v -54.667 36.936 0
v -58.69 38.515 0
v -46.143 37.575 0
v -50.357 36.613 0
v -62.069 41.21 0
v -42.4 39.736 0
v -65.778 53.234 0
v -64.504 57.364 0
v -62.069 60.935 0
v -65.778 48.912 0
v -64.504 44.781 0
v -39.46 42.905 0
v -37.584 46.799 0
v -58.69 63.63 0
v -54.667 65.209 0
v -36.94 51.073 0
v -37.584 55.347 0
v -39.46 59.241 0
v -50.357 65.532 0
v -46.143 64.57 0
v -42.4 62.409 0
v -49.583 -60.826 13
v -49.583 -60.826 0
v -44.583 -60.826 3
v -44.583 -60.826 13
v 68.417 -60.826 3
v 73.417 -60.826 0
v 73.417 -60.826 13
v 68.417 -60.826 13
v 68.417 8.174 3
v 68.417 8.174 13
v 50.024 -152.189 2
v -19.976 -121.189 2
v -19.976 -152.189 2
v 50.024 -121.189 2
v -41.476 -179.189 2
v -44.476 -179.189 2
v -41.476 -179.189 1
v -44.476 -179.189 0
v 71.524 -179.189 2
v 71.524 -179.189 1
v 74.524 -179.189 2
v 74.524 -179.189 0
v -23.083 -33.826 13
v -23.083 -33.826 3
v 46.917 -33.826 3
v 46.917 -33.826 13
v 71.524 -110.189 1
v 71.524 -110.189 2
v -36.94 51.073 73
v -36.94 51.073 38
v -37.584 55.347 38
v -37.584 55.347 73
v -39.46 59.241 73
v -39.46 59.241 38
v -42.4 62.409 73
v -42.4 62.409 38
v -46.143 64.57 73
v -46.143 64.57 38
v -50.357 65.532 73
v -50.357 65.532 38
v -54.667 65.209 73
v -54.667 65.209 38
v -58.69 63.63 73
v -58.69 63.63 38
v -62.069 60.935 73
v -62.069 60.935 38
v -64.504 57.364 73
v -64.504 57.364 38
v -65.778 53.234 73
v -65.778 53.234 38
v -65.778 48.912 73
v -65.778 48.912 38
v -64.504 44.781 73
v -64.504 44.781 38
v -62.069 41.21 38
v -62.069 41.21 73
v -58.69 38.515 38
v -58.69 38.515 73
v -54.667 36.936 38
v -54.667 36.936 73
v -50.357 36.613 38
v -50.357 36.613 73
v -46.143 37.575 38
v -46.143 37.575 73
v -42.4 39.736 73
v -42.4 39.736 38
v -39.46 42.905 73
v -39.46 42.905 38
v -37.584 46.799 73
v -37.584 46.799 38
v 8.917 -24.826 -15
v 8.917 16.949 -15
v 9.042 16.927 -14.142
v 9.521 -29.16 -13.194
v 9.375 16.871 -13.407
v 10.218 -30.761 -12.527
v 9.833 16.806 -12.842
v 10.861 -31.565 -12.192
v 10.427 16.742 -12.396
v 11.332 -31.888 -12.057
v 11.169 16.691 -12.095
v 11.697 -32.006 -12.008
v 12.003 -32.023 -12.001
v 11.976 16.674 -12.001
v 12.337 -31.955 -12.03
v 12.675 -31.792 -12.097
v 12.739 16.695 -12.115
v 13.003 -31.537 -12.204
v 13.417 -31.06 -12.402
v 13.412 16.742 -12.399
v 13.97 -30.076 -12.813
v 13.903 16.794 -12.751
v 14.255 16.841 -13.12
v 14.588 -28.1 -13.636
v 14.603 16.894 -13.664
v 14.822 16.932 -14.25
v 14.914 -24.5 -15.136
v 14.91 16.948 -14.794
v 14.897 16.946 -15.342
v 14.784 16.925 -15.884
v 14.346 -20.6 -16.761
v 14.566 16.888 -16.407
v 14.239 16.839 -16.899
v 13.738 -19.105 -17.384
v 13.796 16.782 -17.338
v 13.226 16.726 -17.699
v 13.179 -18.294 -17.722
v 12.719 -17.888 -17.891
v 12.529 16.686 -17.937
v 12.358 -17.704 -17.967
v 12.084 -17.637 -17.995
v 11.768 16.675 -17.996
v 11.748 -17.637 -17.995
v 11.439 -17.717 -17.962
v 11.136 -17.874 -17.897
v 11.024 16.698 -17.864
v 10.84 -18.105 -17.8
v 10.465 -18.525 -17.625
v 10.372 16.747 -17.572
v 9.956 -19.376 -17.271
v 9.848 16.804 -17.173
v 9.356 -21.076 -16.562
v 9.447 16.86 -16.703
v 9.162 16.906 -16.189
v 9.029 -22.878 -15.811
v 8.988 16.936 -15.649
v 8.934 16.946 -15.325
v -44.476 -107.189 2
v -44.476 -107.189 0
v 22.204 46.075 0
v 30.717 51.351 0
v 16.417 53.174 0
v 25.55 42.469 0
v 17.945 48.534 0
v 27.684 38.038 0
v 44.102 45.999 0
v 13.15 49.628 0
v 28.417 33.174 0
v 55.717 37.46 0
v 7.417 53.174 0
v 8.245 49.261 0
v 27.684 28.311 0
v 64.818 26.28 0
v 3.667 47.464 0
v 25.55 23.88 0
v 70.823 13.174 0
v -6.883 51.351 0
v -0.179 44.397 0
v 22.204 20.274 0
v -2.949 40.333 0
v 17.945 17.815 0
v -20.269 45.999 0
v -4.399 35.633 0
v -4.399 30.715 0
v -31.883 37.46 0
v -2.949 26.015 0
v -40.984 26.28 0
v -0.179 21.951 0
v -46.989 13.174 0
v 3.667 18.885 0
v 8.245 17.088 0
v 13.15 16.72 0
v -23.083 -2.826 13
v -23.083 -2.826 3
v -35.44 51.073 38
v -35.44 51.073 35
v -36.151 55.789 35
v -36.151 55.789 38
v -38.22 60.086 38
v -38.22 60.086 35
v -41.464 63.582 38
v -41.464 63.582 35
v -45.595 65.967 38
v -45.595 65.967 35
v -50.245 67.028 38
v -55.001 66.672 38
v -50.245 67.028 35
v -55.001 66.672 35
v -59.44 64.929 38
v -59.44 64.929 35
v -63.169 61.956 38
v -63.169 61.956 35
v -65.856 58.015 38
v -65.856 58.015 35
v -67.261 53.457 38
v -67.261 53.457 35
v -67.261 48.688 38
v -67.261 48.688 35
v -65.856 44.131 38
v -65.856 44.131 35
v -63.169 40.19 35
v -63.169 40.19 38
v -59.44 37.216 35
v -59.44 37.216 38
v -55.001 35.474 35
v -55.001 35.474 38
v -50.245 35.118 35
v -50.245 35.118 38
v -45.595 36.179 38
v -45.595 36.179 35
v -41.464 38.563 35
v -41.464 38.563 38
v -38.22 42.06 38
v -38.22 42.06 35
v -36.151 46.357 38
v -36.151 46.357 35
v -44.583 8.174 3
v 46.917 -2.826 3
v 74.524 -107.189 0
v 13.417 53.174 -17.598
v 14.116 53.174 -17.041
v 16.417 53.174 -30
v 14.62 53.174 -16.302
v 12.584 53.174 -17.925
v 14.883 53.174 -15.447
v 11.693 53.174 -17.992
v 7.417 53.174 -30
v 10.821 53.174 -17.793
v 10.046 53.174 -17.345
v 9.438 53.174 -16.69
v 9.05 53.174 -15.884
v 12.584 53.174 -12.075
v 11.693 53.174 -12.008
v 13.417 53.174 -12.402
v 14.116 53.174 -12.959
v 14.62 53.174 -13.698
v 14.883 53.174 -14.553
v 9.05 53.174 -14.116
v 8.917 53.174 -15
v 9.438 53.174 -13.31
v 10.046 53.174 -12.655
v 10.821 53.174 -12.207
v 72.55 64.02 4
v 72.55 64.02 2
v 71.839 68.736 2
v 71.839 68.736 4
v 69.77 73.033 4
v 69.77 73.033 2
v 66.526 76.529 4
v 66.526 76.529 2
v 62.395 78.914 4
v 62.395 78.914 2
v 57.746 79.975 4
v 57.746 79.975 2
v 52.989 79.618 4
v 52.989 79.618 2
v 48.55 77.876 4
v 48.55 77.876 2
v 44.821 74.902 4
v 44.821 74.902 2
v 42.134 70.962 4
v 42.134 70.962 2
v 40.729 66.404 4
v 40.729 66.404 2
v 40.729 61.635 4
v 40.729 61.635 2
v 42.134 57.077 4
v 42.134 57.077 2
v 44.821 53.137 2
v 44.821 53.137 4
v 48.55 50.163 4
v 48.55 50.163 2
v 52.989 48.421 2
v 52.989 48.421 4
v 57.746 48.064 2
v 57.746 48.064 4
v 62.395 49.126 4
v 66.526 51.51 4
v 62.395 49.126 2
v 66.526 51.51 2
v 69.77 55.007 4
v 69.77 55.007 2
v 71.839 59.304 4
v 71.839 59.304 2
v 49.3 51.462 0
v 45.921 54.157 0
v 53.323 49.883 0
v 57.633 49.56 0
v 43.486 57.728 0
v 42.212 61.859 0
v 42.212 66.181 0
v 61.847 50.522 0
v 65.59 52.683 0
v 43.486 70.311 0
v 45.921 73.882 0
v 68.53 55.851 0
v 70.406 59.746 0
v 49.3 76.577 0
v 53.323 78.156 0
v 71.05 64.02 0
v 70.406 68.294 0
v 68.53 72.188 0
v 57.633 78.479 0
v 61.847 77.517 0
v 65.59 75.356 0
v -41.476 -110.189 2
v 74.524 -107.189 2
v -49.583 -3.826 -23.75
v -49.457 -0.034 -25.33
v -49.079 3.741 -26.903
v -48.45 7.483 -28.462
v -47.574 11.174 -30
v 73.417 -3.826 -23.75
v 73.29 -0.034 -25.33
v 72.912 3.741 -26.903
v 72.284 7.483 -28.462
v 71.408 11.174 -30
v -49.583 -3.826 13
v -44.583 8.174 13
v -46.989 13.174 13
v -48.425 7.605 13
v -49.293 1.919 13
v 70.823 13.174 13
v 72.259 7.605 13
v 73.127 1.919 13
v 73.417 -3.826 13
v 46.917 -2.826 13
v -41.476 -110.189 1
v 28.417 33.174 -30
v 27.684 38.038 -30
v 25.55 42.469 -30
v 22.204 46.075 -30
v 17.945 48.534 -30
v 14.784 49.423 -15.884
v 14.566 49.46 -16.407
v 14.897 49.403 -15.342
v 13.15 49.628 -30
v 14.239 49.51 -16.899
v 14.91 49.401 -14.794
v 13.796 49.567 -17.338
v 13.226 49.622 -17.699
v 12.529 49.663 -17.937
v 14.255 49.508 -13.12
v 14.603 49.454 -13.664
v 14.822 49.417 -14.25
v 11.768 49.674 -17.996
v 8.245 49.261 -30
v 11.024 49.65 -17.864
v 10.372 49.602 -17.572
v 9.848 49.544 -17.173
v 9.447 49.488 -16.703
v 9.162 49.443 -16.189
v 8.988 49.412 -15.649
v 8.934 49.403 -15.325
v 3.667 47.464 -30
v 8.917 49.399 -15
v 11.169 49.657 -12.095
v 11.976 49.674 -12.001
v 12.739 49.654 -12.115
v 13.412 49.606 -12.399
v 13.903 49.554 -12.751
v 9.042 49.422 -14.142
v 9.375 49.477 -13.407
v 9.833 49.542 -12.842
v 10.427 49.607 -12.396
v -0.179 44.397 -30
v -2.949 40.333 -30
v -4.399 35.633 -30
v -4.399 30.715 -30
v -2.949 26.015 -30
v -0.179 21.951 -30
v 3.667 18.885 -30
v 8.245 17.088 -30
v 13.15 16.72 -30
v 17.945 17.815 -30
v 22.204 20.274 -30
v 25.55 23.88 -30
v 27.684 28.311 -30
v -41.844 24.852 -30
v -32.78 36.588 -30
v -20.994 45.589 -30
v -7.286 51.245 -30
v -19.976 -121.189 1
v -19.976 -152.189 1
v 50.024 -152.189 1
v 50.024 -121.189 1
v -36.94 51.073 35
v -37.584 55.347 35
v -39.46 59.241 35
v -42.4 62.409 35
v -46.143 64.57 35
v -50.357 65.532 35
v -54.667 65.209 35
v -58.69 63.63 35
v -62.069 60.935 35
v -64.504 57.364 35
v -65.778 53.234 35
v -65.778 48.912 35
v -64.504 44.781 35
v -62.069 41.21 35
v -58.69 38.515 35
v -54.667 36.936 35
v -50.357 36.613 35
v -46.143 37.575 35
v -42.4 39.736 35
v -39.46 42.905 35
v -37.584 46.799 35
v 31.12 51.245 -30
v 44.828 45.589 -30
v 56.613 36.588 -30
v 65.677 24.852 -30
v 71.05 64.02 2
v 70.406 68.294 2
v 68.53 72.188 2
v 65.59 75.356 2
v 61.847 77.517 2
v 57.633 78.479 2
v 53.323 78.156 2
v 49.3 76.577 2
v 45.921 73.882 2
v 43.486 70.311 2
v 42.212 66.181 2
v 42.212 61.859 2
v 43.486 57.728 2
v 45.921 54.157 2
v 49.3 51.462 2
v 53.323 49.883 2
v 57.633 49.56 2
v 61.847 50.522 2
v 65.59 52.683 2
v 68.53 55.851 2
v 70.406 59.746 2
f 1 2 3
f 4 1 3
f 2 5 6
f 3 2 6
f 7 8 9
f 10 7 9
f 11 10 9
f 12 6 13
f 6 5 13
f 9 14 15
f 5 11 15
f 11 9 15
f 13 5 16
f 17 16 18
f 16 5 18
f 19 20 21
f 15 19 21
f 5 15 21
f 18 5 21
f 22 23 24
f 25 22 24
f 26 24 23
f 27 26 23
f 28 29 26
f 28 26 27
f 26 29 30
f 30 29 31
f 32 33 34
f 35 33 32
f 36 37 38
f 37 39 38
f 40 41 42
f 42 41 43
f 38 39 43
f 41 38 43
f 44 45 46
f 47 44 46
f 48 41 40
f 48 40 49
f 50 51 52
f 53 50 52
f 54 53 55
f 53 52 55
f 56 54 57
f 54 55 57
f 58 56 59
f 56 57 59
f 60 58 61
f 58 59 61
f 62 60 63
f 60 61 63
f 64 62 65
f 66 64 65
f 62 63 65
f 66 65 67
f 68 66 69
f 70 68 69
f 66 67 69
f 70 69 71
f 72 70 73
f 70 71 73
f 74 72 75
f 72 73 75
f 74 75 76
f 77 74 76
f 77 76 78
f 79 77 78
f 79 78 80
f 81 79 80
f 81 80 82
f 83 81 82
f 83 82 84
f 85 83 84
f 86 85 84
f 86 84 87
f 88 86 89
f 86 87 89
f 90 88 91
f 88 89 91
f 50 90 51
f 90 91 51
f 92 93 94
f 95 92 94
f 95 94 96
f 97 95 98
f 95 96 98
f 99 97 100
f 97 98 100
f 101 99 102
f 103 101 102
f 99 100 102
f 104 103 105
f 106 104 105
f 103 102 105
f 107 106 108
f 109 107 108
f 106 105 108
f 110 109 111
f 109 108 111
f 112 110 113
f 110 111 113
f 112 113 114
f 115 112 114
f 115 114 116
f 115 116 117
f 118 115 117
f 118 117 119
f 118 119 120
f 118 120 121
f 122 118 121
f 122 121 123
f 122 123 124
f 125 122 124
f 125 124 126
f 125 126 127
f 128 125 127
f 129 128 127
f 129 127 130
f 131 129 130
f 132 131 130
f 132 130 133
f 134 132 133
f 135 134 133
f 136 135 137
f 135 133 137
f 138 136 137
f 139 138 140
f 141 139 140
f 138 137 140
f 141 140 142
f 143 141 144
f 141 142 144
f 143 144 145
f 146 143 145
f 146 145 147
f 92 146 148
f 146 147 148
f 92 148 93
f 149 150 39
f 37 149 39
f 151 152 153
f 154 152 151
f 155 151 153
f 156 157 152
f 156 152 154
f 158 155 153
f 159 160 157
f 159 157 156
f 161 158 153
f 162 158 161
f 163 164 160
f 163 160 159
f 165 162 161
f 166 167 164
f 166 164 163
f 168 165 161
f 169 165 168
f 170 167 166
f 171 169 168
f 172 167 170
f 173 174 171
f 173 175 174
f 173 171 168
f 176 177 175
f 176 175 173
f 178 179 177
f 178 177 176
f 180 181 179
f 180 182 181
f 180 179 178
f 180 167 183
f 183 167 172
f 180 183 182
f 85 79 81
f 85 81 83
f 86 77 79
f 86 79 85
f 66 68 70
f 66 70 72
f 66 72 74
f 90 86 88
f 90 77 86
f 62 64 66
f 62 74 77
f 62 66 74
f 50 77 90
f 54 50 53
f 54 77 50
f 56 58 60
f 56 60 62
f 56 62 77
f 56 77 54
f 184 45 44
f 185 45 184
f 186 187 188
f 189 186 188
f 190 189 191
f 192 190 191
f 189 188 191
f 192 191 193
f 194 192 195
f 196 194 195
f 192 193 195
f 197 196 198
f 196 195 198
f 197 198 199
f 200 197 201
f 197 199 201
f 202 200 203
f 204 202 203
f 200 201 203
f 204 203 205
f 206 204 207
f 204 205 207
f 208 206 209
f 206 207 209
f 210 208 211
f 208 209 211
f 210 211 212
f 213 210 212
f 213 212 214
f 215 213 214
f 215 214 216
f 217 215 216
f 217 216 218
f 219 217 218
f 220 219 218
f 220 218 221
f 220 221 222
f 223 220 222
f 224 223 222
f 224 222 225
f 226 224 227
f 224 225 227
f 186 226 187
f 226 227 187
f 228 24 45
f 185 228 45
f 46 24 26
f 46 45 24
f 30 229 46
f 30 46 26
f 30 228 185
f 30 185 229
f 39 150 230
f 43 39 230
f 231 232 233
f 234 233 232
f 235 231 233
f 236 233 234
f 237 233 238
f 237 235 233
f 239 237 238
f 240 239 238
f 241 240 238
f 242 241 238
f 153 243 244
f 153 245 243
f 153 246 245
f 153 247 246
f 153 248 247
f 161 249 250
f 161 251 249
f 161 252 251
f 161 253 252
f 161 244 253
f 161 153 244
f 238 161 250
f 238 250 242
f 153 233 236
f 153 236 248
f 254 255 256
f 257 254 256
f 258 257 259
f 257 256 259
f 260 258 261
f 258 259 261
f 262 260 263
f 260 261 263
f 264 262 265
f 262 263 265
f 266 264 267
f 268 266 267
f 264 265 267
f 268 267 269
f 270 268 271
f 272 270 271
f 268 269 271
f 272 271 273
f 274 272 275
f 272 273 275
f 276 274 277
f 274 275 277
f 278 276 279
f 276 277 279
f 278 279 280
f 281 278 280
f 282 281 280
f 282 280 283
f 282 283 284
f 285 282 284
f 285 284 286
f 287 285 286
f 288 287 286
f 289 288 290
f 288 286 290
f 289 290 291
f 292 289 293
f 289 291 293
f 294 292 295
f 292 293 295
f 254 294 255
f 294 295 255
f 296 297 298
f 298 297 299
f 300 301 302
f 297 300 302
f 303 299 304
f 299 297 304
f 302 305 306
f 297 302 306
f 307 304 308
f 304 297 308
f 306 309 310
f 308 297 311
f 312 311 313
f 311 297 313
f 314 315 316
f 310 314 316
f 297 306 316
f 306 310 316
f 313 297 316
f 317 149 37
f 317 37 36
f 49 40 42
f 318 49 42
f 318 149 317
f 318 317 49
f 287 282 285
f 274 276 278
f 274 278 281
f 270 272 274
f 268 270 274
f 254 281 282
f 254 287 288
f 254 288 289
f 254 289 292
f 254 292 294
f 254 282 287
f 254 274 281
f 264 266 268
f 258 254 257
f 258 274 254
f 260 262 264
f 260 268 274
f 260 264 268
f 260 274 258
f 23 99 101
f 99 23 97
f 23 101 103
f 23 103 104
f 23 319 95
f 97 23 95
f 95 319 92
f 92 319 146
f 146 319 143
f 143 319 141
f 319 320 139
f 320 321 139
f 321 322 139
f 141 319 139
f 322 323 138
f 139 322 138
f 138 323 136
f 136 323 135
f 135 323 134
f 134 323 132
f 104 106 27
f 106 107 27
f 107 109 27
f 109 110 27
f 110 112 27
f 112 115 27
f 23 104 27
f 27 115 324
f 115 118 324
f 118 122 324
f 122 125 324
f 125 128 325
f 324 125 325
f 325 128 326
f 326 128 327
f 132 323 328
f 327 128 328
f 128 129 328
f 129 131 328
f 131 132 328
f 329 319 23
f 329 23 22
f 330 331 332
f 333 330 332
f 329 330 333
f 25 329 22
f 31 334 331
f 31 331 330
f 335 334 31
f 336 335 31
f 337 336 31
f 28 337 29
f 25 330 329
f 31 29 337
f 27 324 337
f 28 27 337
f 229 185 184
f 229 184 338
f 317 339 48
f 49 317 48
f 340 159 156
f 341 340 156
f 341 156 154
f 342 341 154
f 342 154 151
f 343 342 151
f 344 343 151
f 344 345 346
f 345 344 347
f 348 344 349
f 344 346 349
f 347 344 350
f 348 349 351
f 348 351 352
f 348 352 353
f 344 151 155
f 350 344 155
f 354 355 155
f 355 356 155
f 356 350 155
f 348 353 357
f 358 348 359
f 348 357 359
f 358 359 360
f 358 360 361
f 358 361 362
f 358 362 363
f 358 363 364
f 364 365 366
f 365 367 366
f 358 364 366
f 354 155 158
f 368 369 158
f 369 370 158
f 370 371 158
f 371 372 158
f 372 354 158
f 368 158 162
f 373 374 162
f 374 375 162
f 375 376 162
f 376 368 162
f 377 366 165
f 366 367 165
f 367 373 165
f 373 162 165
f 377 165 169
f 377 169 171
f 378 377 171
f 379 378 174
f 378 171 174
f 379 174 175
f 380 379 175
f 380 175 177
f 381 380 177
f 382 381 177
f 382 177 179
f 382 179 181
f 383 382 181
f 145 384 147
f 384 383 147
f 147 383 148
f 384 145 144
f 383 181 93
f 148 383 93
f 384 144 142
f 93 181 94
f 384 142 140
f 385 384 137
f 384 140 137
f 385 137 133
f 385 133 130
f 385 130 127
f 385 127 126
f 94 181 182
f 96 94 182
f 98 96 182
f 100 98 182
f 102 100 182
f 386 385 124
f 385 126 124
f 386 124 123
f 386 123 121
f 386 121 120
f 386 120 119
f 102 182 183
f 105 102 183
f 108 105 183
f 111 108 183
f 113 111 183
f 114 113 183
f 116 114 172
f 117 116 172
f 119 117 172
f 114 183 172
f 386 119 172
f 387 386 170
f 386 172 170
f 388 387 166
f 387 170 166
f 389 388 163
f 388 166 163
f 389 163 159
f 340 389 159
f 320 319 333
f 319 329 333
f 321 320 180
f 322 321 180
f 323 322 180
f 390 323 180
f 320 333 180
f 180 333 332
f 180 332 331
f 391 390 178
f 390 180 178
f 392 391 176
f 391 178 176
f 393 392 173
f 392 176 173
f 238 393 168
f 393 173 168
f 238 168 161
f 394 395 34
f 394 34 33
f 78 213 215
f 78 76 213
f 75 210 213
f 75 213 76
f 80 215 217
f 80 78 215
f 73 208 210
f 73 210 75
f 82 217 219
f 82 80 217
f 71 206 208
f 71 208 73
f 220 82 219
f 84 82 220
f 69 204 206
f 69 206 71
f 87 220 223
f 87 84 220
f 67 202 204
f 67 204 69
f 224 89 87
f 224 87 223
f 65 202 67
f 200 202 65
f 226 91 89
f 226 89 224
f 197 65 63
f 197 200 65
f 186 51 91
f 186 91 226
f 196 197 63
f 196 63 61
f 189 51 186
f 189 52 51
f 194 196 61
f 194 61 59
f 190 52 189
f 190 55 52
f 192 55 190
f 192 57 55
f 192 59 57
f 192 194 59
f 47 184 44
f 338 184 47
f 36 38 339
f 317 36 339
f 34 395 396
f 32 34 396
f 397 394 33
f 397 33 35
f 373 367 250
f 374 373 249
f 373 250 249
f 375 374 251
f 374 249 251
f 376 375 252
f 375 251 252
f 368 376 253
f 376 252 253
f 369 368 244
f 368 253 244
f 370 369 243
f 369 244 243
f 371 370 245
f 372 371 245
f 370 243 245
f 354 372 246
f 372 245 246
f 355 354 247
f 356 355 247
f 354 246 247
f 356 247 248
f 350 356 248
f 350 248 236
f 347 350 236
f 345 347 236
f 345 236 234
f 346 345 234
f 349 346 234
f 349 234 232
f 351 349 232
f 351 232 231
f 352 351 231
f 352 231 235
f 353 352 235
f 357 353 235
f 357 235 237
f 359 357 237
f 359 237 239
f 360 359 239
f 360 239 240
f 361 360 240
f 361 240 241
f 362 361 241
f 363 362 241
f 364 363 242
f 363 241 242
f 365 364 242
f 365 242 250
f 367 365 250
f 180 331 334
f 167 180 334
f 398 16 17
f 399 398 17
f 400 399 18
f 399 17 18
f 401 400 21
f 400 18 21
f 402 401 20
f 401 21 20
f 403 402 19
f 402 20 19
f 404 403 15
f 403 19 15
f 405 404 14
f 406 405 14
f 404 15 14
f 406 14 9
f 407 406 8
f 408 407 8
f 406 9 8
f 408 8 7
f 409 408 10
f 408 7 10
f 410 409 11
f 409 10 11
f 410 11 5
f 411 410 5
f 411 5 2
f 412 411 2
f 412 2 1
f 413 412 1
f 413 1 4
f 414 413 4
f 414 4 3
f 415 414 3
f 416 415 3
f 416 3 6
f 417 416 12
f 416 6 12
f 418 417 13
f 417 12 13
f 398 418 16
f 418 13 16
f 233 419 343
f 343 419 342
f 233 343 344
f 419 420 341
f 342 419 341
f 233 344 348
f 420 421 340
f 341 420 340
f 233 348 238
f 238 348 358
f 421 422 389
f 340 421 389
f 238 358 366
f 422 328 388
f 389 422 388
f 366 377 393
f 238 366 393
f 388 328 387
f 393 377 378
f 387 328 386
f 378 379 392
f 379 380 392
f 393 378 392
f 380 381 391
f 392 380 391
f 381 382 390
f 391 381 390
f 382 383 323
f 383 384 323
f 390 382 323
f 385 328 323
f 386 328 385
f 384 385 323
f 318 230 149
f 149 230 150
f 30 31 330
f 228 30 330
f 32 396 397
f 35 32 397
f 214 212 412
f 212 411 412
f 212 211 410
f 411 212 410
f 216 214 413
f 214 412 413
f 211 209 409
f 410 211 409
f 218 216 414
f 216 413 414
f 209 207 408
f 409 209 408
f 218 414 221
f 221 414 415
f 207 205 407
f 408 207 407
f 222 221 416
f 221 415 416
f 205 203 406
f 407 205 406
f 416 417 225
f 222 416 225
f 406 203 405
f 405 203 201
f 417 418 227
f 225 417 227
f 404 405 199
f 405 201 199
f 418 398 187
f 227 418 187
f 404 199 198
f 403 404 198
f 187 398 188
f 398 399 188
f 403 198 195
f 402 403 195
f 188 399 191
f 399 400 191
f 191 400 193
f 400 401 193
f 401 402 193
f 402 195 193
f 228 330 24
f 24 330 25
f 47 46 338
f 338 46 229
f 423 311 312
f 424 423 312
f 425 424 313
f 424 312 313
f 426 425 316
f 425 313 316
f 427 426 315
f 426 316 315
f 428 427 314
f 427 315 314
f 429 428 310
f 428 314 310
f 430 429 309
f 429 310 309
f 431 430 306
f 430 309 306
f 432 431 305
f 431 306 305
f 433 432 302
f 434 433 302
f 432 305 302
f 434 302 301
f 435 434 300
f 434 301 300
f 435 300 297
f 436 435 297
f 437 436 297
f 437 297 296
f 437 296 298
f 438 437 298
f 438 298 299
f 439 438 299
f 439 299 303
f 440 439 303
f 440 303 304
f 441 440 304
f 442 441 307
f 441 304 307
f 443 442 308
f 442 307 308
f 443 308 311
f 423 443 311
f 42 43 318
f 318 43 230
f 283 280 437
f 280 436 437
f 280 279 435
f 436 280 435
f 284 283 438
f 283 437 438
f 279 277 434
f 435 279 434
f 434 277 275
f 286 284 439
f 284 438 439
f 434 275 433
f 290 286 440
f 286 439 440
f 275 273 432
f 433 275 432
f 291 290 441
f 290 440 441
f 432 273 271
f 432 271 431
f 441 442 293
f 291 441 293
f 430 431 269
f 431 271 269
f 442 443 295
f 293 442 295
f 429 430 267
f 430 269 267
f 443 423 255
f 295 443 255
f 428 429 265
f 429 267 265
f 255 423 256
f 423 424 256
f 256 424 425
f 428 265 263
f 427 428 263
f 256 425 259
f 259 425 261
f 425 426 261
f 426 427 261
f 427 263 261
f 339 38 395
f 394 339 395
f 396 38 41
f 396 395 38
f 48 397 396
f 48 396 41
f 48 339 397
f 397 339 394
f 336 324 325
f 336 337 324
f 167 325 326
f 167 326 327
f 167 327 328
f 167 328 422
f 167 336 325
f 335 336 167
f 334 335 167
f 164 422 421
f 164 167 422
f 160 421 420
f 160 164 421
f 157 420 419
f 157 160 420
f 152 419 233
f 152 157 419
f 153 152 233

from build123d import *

# Parameters (mm, degrees)
F0_R      = 14.5
F1_DEPTH  = 35
F2_R      = 16
F3_DEPTH  = 3
F4_R      = 14.5
F5_DEPTH  = 35
F6_W      = 113
F6_H      = 69
F7_DEPTH  = 3
F8_W      = 70
F8_H      = 31
F9_DEPTH  = 10
F10_W     = 69
F10_H     = 13
F11_DEPTH = 5
F12_W     = 118
F12_H     = 13
F13_DEPTH = 5
F14_W     = 74
F14_H     = 13
F15_DEPTH = 5
F16_W     = 123
F16_H     = 74
F17_DEPTH = 30
F18_W     = 123
F18_H     = 30
F19_DEPTH = 40
F20_R     = 16.5
F21_DEPTH = 30.001
F22_SIZE2 = 72
F22_SIZE  = 30
F23_R     = 57
F24_R     = 57
F25_R     = 3
F26_DEPTH = 114.001
F27_R     = 14.5
F28_DEPTH = 2
F29_R     = 16
F30_DEPTH = 2
F31_W     = 119
F31_H     = 72
F32_DEPTH = 1
F33_W     = 3
F33_H     = 3
F33_W_2   = 113
F33_H_2   = 69
F34_DEPTH = 1
F35_W     = 70
F35_H     = 31
F36_DEPTH = 1


with BuildPart() as f1:
    # F0 (on Top) → F1 (new body)
    with BuildSketch(Plane.XY):
        with Locations((-51.4401979744, 51.072768867)):
            Circle(F0_R)
    extrude(amount=F1_DEPTH)

    # F2 (on face) → F3 (join)
    with BuildSketch(Plane.XY.offset(35)):
        with Locations((-51.4401979744, 51.072768867)):
            Circle(F2_R)
    extrude(amount=F3_DEPTH)

    # F4 (on face) → F5 (join)
    with BuildSketch(Plane.XY.offset(38)):
        with Locations((-51.4401979744, 51.072768867)):
            Circle(F4_R)
    extrude(amount=F5_DEPTH)


with BuildPart() as f7:
    # F6 (on Top) → F7 (new body)
    with BuildSketch(Plane.XY):
        with Locations((11.9167239517, -26.3256993649)):
            Rectangle(F6_W, F6_H)
    extrude(amount=F7_DEPTH)

    # F8 (on face) → F9 (join)
    with BuildSketch(Plane.XY.offset(3)):
        with Locations((11.9167239517, -18.3256993649)):
            Rectangle(F8_W, F8_H)
    extrude(amount=F9_DEPTH)

    # F10 (on face) → F11 (join)
    with BuildSketch(Plane.YZ.offset(68.4167239517)):
        with Locations((-26.3256993649, 6.5)):
            Rectangle(F10_W, F10_H)
    extrude(amount=F11_DEPTH)

    # F12 (on face) → F13 (join)
    with BuildSketch(Plane(origin=(0, 8.1743006351, 0), x_dir=(-1, 0, 0), z_dir=(0, 1, 0))):
        with Locations((-14.4167239517, 6.5)):
            Rectangle(F12_W, F12_H)
    extrude(amount=F13_DEPTH)

    # F14 (on face) → F15 (join)
    with BuildSketch(Plane(origin=(-44.5832760483, 0, 0), x_dir=(0, -1, 0), z_dir=(-1, 0, 0))):
        with Locations((23.8256993649, 6.5)):
            Rectangle(F14_W, F14_H)
    extrude(amount=F15_DEPTH)

    # F16 (on face) → F17 (join)
    with BuildSketch(Plane(origin=(0, 0, 0), x_dir=(1, 0, 0), z_dir=(0, 0, -1))):
        with Locations((11.9167239517, 23.8256993649)):
            Rectangle(F16_W, F16_H)
    extrude(amount=F17_DEPTH)

    # F18 (on face) → F19 (join)
    with BuildSketch(Plane(origin=(0, 13.1743006351, 0), x_dir=(-1, 0, 0), z_dir=(0, 1, 0))):
        with Locations((-11.9167239517, -15)):
            Rectangle(F18_W, F18_H)
    extrude(amount=F19_DEPTH)

    # F20 (on face) → F21 (cut, through all)
    with BuildSketch(Plane.XY):
        with Locations((11.9167239517, 33.1743006351)):
            Circle(F20_R)
    extrude(amount=-F21_DEPTH, mode=Mode.SUBTRACT)

    # F22
    f22_edges = [f7.edges().sort_by_distance(p)[0] for p in [
        (11.916724, -60.825699, -30),
    ]]
    chamfer(f22_edges, length=F22_SIZE, length2=F22_SIZE2)

    # F23
    f23_edges = [f7.edges().sort_by_distance(p)[0] for p in [
        (73.416724, 53.174301, -15),
    ]]
    fillet(f23_edges, radius=F23_R)

    # F24
    f24_edges = [f7.edges().sort_by_distance(p)[0] for p in [
        (-49.583276, 53.174301, -15),
    ]]
    fillet(f24_edges, radius=F24_R)

    # F25 (on face) → F26 (cut, through all)
    with BuildSketch(Plane(origin=(0, 53.1743006351, 0), x_dir=(-1, 0, 0), z_dir=(0, 1, 0))):
        with Locations((-11.9167239517, -15)):
            Circle(F25_R)
    extrude(amount=-F26_DEPTH, mode=Mode.SUBTRACT)


with BuildPart() as f28:
    # F27 (on Top) → F28 (new body)
    with BuildSketch(Plane.XY):
        with Locations((56.549821049, 64.0196353197)):
            Circle(F27_R)
    extrude(amount=F28_DEPTH)

    # F29 (on face) → F30 (join)
    with BuildSketch(Plane.XY.offset(2)):
        with Locations((56.549821049, 64.0196353197)):
            Circle(F29_R)
    extrude(amount=F30_DEPTH)


with BuildPart() as f32:
    # F31 (on Top) → F32 (new body)
    with BuildSketch(Plane.XY):
        with Locations((15.024092472, -143.1891386509)):
            Rectangle(F31_W, F31_H)
    extrude(amount=F32_DEPTH)

    # F33 (on face) → F34 (join)
    with BuildSketch(Plane.XY.offset(1)):
        with Locations((-42.975907528, -108.6891386509)):
            Rectangle(F33_W, F33_H)
        with Locations((15.024092472, -108.6891386509)):
            Rectangle(F33_W_2, F33_H)
        with Locations((-42.975907528, -144.6891386509)):
            Rectangle(F33_W, F33_H_2)
        with Locations((73.024092472, -108.6891386509)):
            Rectangle(F33_W, F33_H)
        with Locations((73.024092472, -144.6891386509)):
            Rectangle(F33_W, F33_H_2)
    extrude(amount=F34_DEPTH)

    # F35 (on face) → F36 (join)
    with BuildSketch(Plane.XY.offset(1)):
        with Locations((15.024092472, -136.6891386509)):
            Rectangle(F35_W, F35_H)
    extrude(amount=F36_DEPTH)


solid = Compound([f1.part, f7.part, f28.part, f32.part])
